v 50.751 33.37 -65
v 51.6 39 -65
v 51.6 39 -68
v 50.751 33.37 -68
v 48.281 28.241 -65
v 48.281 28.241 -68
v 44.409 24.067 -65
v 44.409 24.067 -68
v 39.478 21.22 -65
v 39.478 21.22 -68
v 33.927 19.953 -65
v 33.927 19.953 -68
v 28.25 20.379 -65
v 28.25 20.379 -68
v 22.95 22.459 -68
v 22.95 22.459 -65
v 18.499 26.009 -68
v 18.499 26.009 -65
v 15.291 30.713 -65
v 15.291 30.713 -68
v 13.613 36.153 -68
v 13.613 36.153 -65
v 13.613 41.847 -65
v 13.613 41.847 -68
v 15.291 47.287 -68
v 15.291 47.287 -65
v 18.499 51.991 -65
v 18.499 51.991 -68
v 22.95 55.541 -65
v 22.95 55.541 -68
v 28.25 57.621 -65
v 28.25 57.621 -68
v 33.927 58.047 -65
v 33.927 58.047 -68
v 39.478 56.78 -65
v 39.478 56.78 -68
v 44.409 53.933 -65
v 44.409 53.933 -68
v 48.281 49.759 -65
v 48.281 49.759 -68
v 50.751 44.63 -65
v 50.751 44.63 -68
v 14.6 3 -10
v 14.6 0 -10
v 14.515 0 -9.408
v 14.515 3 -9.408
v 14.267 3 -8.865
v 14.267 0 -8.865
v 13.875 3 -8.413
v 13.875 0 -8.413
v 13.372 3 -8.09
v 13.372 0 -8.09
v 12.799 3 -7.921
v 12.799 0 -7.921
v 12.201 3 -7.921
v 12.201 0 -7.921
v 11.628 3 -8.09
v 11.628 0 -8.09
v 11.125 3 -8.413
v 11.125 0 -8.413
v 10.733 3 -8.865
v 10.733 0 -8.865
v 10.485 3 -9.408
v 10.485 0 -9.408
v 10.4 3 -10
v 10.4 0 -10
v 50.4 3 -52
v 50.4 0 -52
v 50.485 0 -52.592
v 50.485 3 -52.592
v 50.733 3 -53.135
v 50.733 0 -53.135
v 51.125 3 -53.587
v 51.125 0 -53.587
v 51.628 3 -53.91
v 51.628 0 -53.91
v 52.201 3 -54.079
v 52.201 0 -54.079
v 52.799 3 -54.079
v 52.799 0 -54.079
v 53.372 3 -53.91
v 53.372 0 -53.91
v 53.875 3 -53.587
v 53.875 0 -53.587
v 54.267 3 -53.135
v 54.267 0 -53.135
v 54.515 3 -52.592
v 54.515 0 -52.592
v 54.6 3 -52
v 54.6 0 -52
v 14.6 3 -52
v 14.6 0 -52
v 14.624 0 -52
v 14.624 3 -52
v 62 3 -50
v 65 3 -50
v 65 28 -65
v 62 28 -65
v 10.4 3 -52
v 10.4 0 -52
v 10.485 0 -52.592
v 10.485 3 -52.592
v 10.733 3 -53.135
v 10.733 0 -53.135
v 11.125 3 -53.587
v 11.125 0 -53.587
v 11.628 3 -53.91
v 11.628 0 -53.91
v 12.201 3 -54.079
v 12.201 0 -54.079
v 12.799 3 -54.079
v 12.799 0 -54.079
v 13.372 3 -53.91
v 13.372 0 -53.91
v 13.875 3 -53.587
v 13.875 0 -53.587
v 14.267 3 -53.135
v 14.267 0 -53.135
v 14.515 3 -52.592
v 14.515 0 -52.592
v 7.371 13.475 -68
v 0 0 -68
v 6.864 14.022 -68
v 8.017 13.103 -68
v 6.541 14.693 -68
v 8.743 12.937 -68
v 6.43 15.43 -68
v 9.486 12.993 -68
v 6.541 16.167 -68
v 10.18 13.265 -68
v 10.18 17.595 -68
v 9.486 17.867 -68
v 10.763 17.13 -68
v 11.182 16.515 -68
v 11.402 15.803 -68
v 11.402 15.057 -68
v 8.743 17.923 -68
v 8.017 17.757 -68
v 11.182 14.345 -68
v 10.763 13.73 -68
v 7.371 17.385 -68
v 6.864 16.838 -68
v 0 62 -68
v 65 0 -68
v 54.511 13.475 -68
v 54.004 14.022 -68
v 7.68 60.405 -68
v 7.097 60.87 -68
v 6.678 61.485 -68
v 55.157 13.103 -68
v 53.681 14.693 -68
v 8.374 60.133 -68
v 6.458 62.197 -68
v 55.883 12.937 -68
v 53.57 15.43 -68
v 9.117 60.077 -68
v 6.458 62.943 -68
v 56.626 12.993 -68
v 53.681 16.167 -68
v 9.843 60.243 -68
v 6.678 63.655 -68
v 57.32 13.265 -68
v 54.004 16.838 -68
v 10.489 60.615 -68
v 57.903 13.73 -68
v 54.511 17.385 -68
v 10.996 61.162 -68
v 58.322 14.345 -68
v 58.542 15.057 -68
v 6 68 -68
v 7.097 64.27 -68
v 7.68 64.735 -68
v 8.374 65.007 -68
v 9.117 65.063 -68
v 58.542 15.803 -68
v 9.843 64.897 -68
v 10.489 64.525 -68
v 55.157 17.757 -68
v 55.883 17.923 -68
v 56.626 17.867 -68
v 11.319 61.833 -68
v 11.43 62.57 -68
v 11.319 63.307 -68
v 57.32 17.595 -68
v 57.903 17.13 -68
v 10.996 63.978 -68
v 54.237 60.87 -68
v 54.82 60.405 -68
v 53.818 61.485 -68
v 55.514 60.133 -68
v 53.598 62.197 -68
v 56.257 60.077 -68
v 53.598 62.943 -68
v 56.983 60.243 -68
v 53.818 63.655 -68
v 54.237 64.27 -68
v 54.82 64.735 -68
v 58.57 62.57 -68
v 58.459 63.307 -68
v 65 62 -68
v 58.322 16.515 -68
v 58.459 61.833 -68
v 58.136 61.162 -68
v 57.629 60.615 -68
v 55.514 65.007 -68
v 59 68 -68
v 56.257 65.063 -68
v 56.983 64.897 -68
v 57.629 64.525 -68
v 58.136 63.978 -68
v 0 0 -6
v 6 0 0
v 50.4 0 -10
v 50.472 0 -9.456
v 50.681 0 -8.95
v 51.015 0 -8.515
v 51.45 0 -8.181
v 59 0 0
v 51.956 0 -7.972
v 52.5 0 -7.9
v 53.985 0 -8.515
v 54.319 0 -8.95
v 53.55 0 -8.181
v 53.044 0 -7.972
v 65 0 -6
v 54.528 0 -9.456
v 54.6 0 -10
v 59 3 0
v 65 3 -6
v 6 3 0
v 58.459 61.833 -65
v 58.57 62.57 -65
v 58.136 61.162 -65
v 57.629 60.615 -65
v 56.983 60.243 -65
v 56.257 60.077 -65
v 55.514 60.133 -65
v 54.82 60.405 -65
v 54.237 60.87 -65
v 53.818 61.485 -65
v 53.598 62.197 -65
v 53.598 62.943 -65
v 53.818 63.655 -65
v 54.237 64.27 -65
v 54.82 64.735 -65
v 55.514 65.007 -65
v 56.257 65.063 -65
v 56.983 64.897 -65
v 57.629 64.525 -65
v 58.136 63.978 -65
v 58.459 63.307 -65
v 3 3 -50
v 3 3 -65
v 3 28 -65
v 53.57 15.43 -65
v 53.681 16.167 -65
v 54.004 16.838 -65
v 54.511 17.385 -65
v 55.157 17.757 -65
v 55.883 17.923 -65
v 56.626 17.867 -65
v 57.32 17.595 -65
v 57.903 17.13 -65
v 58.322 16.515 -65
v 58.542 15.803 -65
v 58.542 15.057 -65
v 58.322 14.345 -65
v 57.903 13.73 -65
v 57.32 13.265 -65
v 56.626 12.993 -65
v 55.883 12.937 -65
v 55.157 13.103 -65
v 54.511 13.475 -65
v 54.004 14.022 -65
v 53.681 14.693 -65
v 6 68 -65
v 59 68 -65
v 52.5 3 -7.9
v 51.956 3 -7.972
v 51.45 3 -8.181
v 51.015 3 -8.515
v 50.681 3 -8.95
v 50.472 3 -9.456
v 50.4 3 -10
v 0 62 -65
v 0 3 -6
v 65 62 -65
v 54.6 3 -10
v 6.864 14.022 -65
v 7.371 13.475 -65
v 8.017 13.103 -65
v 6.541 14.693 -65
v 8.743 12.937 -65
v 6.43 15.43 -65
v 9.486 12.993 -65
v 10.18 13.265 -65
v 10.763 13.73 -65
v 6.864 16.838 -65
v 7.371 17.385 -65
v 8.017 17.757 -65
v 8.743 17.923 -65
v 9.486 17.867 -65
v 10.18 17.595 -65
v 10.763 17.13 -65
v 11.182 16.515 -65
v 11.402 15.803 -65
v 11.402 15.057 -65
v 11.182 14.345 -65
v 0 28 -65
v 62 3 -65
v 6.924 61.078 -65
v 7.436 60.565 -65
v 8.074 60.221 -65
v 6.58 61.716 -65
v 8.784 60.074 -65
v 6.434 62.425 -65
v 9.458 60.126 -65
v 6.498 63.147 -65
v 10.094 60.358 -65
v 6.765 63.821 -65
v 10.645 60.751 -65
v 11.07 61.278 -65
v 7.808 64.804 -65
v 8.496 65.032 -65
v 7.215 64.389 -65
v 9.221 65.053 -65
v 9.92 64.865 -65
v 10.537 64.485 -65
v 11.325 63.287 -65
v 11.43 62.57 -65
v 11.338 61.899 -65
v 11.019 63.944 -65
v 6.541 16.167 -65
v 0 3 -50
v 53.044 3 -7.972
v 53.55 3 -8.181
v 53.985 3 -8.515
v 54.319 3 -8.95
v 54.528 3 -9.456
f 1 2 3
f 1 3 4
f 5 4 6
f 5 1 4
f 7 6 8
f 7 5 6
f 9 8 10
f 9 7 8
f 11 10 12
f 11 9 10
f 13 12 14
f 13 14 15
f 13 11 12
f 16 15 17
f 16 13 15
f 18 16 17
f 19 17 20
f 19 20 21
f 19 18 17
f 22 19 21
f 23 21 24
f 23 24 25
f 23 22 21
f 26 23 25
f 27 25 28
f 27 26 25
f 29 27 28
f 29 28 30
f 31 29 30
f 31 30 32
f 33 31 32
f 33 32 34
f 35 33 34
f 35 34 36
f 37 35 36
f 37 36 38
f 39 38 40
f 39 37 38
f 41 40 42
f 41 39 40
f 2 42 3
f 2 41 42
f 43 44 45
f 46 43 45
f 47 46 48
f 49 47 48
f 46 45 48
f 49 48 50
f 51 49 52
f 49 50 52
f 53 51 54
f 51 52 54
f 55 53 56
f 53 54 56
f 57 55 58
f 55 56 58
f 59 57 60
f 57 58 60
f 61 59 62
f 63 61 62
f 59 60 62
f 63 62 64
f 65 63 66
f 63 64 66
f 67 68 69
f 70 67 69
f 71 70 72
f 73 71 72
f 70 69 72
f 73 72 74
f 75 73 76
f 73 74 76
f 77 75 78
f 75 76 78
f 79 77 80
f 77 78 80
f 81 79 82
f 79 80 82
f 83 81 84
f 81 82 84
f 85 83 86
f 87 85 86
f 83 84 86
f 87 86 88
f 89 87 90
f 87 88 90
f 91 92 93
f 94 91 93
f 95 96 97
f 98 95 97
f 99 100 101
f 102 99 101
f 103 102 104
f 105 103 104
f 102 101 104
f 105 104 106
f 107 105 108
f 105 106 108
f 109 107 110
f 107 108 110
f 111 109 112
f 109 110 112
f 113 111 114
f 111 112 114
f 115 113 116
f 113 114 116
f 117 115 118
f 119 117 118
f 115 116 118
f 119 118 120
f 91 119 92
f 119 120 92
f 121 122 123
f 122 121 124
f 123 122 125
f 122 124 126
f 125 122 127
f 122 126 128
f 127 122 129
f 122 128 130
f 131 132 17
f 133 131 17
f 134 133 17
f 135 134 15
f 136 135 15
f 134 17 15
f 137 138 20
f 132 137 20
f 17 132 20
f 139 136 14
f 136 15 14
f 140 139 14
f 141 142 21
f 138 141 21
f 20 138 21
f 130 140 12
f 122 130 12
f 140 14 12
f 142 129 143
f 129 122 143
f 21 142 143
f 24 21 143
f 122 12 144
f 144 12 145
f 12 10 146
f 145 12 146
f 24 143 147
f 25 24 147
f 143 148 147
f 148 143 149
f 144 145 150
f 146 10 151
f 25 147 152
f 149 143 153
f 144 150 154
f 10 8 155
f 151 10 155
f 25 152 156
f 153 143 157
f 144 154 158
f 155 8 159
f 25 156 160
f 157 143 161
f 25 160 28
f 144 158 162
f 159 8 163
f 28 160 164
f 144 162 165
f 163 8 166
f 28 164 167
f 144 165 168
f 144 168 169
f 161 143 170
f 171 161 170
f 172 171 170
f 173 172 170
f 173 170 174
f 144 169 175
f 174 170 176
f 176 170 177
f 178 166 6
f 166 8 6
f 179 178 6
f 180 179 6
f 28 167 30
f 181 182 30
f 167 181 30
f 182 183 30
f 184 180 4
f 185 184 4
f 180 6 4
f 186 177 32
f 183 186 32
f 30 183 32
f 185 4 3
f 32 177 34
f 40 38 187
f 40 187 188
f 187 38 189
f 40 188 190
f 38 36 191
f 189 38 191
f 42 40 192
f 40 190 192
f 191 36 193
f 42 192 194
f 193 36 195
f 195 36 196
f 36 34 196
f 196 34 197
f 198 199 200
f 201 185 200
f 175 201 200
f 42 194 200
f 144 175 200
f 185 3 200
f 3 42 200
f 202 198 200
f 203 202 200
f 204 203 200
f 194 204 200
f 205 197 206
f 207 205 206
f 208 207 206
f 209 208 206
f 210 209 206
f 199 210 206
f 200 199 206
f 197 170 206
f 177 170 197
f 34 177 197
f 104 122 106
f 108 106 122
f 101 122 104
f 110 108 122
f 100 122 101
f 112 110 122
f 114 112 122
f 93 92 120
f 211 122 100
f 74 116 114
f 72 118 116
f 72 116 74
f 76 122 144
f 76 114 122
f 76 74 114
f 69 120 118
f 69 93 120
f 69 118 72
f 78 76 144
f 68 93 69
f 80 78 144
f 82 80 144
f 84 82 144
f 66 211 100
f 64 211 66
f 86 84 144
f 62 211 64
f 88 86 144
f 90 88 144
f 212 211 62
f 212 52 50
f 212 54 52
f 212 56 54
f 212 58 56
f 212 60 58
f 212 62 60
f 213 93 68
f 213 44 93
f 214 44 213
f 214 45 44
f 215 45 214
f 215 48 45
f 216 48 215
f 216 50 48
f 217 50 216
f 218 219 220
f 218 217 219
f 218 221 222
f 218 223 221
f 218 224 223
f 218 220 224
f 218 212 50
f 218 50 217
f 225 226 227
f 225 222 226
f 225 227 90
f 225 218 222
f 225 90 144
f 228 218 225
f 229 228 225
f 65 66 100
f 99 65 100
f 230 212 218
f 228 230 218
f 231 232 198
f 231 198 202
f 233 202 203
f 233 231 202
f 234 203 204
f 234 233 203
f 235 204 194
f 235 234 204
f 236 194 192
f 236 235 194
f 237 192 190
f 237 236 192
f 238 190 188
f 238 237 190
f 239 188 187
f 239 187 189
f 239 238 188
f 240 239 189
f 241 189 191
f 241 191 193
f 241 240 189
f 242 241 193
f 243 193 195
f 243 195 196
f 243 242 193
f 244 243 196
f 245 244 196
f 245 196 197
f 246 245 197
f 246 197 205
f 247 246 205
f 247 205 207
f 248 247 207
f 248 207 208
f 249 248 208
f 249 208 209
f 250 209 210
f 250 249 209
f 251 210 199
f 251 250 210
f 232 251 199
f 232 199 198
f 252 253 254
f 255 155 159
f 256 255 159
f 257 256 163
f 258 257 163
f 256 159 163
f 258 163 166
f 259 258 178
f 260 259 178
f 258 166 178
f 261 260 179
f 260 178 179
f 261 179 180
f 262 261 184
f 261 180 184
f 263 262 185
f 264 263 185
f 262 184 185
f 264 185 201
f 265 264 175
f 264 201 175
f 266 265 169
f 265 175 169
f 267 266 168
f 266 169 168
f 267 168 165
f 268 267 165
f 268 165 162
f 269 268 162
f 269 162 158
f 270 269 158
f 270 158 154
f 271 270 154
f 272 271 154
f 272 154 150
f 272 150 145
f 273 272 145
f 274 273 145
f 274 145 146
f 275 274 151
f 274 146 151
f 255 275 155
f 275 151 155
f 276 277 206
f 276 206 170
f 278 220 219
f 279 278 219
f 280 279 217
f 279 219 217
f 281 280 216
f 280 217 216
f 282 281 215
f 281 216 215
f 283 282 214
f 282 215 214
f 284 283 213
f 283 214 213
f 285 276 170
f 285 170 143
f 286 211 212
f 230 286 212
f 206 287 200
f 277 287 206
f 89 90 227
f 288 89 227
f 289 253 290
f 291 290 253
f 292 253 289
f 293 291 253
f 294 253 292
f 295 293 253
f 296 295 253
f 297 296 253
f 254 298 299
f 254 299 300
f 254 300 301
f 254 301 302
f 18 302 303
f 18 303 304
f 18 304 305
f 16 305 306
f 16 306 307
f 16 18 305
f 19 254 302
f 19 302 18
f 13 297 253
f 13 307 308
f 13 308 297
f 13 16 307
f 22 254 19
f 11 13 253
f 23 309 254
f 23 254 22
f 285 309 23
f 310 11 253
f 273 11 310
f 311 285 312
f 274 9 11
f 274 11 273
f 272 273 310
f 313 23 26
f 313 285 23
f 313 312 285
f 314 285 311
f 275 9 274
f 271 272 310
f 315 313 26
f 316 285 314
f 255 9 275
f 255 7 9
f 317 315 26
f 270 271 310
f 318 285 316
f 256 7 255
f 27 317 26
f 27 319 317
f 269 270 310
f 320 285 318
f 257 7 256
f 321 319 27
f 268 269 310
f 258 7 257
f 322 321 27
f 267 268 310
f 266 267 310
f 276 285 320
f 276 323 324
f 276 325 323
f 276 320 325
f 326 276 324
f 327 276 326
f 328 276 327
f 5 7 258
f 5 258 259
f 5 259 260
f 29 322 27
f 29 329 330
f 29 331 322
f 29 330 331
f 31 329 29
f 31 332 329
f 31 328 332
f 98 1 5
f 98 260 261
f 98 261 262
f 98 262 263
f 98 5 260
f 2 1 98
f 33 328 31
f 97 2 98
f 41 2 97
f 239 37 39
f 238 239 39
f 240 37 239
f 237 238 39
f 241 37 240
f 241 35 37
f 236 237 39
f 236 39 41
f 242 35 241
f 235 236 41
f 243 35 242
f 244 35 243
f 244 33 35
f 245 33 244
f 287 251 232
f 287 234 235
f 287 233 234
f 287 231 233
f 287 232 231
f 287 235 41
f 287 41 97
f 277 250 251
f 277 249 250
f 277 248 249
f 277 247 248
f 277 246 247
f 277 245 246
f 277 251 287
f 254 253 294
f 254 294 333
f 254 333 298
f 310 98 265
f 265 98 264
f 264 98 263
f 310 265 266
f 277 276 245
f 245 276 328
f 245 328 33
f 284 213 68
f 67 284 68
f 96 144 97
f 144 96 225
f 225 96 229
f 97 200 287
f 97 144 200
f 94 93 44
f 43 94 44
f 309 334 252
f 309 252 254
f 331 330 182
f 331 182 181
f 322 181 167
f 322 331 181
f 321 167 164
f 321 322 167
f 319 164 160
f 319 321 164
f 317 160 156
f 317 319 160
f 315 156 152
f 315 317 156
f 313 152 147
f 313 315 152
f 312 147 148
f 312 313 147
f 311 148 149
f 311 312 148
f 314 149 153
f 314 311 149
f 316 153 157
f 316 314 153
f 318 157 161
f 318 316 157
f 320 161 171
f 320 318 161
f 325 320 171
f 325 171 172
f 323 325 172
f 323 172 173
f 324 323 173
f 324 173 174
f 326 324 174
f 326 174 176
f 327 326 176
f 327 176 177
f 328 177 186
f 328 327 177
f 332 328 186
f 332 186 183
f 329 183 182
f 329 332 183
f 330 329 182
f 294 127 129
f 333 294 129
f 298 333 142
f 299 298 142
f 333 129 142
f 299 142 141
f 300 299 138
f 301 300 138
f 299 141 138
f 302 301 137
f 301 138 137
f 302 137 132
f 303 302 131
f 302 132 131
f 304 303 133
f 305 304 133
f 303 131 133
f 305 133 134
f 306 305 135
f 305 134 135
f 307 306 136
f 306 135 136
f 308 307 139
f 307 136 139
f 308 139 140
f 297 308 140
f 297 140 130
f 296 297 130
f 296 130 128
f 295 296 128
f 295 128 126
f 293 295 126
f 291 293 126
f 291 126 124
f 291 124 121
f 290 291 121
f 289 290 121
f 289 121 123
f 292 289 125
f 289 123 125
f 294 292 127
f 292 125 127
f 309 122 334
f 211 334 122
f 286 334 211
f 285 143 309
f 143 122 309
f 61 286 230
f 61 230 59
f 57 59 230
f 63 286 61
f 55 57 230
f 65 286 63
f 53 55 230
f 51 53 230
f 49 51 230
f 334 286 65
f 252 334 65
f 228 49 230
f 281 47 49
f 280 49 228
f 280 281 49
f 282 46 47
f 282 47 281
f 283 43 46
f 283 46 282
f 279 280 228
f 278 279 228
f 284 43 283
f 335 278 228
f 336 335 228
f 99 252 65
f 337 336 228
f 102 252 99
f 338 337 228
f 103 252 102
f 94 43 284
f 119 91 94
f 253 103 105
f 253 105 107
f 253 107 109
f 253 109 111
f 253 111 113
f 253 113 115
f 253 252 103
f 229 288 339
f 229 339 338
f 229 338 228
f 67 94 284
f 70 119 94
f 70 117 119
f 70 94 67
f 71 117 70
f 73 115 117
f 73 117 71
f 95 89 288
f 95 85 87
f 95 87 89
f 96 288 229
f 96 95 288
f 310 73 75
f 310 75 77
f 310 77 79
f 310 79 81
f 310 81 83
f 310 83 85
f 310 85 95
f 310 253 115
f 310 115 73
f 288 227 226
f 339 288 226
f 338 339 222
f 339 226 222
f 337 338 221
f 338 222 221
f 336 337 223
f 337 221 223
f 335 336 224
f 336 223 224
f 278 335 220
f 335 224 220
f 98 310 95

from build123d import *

# Parameters (mm, degrees)
BOSS_EXTRUDE1_DEPTH = 3
SKETCH2_W           = 65
SKETCH2_H           = 3
BOSS_EXTRUDE2_DEPTH = 65
CUT_EXTRUDE1_REACH  = 114.663
SKETCH3_R           = 2.5
SKETCH3_R_2         = 19.1
SKETCH4_R           = 19.1
SKETCH4_R_2         = 2.5
BOSS_EXTRUDE3_DEPTH = 3
SKETCH5_W           = 65
SKETCH5_H           = 66.483873972
CUT_EXTRUDE2_DEPTH  = 3
SKETCH6_R           = 2.5
CUT_EXTRUDE3_DEPTH  = 3
BOSS_EXTRUDE5_DEPTH = 3
BOSS_EXTRUDE6_DEPTH = 3


with BuildPart() as part:
    # Sketch1 → Boss-Extrude1 (new body)
    with BuildSketch(Plane(origin=(0, 0, 0), x_dir=(1, 0, 0), z_dir=(0, 1, 0))):
        Polygon((52.5, 0), (59, 0), (65, 6), (65, 65), (0, 65), (0, 6), (6, 0), align=None)
        with BuildLine():
            ThreePointArc((54.6, 10), (53.98492424, 8.51507576), (52.5, 7.9))
            ThreePointArc((52.5, 7.9), (51.01507576, 8.51507576), (50.4, 10))
            Line((50.4, 10), (50.4, 52))
            ThreePointArc((50.4, 52), (52.5, 54.1), (54.6, 52))
            Line((54.6, 52), (54.6, 10))
        make_face(mode=Mode.SUBTRACT)
        with BuildLine():
            Line((14.6, 52), (14.624057294, 52))
            Line((14.624057294, 52), (14.6, 10))
            ThreePointArc((14.6, 10), (12.5, 7.9), (10.4, 10))
            Line((10.4, 10), (10.4, 52))
            ThreePointArc((10.4, 52), (12.5, 54.1), (14.6, 52))
        make_face(mode=Mode.SUBTRACT)
    extrude(amount=BOSS_EXTRUDE1_DEPTH)

    # Sketch2 → Boss-Extrude2 (add)
    with BuildSketch(Plane(origin=(0, 3, 0), x_dir=(1, 0, 0), z_dir=(0, 1, 0))):
        with Locations((32.5, 63.5)):
            Rectangle(SKETCH2_W, SKETCH2_H)
    extrude(amount=BOSS_EXTRUDE2_DEPTH)

    # Sketch3 → Cut-Extrude1 (cut, up to next)
    with BuildSketch(Plane.XY.offset(-62), mode=Mode.PRIVATE) as cut_extrude1_sk1:
        Polygon((6, 68), (0, 68), (0, 62), align=None)
    cut_extrude1_tool1 = extrude(cut_extrude1_sk1.sketch, amount=-CUT_EXTRUDE1_REACH, mode=Mode.PRIVATE) & part.part
    # Sketch3 → Cut-Extrude1 (cut, up to next)
    with BuildSketch(Plane.XY.offset(-62), mode=Mode.PRIVATE) as cut_extrude1_sk2:
        with Locations((8.93, 15.43)):
            Circle(SKETCH3_R)
    cut_extrude1_tool2 = extrude(cut_extrude1_sk2.sketch, amount=-CUT_EXTRUDE1_REACH, mode=Mode.PRIVATE) & part.part
    # Sketch3 → Cut-Extrude1 (cut, up to next)
    with BuildSketch(Plane.XY.offset(-62), mode=Mode.PRIVATE) as cut_extrude1_sk3:
        with Locations((56.07, 15.43)):
            Circle(SKETCH3_R)
    cut_extrude1_tool3 = extrude(cut_extrude1_sk3.sketch, amount=-CUT_EXTRUDE1_REACH, mode=Mode.PRIVATE) & part.part
    # Sketch3 → Cut-Extrude1 (cut, up to next)
    with BuildSketch(Plane.XY.offset(-62), mode=Mode.PRIVATE) as cut_extrude1_sk4:
        with Locations((56.07, 62.57)):
            Circle(SKETCH3_R)
    cut_extrude1_tool4 = extrude(cut_extrude1_sk4.sketch, amount=-CUT_EXTRUDE1_REACH, mode=Mode.PRIVATE) & part.part
    # Sketch3 → Cut-Extrude1 (cut, up to next)
    with BuildSketch(Plane.XY.offset(-62), mode=Mode.PRIVATE) as cut_extrude1_sk5:
        with Locations((32.5, 39)):
            Circle(SKETCH3_R_2)
    cut_extrude1_tool5 = extrude(cut_extrude1_sk5.sketch, amount=-CUT_EXTRUDE1_REACH, mode=Mode.PRIVATE) & part.part
    # Sketch3 → Cut-Extrude1 (cut, up to next)
    with BuildSketch(Plane.XY.offset(-62), mode=Mode.PRIVATE) as cut_extrude1_sk6:
        Polygon((65, 68), (59, 68), (65, 62), align=None)
    cut_extrude1_tool6 = extrude(cut_extrude1_sk6.sketch, amount=-CUT_EXTRUDE1_REACH, mode=Mode.PRIVATE) & part.part
    # Sketch3 → Cut-Extrude1 (cut, up to next)
    with BuildSketch(Plane.XY.offset(-62), mode=Mode.PRIVATE) as cut_extrude1_sk7:
        with BuildLine():
            ThreePointArc((11.43, 62.57), (7.214795913, 64.388811408), (8.783540049, 60.074293791))
            ThreePointArc((8.783540049, 60.074293791), (10.645204087, 60.751188592), (11.43, 62.57))
        make_face()
    cut_extrude1_tool7 = extrude(cut_extrude1_sk7.sketch, amount=-CUT_EXTRUDE1_REACH, mode=Mode.PRIVATE) & part.part
    add(cut_extrude1_tool1.solids().sort_by_distance((2, 66, -62))[0], mode=Mode.SUBTRACT)
    add(cut_extrude1_tool2.solids().sort_by_distance((8.93, 15.43, -62))[0], mode=Mode.SUBTRACT)
    add(cut_extrude1_tool3.solids().sort_by_distance((56.07, 15.43, -62))[0], mode=Mode.SUBTRACT)
    add(cut_extrude1_tool4.solids().sort_by_distance((56.07, 62.57, -62))[0], mode=Mode.SUBTRACT)
    add(cut_extrude1_tool5.solids().sort_by_distance((32.5, 39, -62))[0], mode=Mode.SUBTRACT)
    add(cut_extrude1_tool6.solids().sort_by_distance((63, 66, -62))[0], mode=Mode.SUBTRACT)
    add(cut_extrude1_tool7.solids().sort_by_distance((8.93, 62.57, -62))[0], mode=Mode.SUBTRACT)

    # Sketch4 → Boss-Extrude3 (add)
    with BuildSketch(Plane(origin=(0, 0, -65), x_dir=(-1, 0, 0), z_dir=(0, 0, -1))):
        Polygon((-65, 62), (-59, 68), (-6, 68), (0, 62), (0, 0), (-65, 0), align=None)
        with Locations(Location((-32.5, 39, 0), (0, 0, 180))):
            Circle(SKETCH4_R, mode=Mode.SUBTRACT)
        with Locations(Location((-56.07, 62.57, 0), (0, 0, 180))):
            Circle(SKETCH4_R_2, mode=Mode.SUBTRACT)
        with Locations(Location((-8.93, 62.57, 0), (0, 0, 180))):
            Circle(SKETCH4_R_2, mode=Mode.SUBTRACT)
    extrude(amount=BOSS_EXTRUDE3_DEPTH)

    # Sketch5 → Cut-Extrude2 (cut)
    with BuildSketch(Plane.XY.offset(-62)):
        with Locations((32.5, 36.241936986)):
            Rectangle(SKETCH5_W, SKETCH5_H)
    extrude(amount=-CUT_EXTRUDE2_DEPTH, mode=Mode.SUBTRACT)

    # Sketch6 → Cut-Extrude3 (cut)
    with BuildSketch(Plane(origin=(0, 0, -68), x_dir=(-1, 0, 0), z_dir=(0, 0, -1))):
        with Locations((-56.07, 15.43)):
            Circle(SKETCH6_R)
        with Locations((-8.93, 15.43)):
            Circle(SKETCH6_R)
    extrude(amount=-CUT_EXTRUDE3_DEPTH, mode=Mode.SUBTRACT)

    # Sketch7 → Boss-Extrude5 (add)
    with BuildSketch(Plane.ZY):
        Polygon((-65, 3), (-50, 3), (-65, 28), align=None)
    extrude(amount=-BOSS_EXTRUDE5_DEPTH)

    # Sketch8 → Boss-Extrude6 (add)
    with BuildSketch(Plane(origin=(65, 0, 0), x_dir=(0, 0, -1), z_dir=(1, 0, 0))):
        Polygon((65, 3), (50, 3), (65, 28), align=None)
    extrude(amount=-BOSS_EXTRUDE6_DEPTH)


solid = part.part
